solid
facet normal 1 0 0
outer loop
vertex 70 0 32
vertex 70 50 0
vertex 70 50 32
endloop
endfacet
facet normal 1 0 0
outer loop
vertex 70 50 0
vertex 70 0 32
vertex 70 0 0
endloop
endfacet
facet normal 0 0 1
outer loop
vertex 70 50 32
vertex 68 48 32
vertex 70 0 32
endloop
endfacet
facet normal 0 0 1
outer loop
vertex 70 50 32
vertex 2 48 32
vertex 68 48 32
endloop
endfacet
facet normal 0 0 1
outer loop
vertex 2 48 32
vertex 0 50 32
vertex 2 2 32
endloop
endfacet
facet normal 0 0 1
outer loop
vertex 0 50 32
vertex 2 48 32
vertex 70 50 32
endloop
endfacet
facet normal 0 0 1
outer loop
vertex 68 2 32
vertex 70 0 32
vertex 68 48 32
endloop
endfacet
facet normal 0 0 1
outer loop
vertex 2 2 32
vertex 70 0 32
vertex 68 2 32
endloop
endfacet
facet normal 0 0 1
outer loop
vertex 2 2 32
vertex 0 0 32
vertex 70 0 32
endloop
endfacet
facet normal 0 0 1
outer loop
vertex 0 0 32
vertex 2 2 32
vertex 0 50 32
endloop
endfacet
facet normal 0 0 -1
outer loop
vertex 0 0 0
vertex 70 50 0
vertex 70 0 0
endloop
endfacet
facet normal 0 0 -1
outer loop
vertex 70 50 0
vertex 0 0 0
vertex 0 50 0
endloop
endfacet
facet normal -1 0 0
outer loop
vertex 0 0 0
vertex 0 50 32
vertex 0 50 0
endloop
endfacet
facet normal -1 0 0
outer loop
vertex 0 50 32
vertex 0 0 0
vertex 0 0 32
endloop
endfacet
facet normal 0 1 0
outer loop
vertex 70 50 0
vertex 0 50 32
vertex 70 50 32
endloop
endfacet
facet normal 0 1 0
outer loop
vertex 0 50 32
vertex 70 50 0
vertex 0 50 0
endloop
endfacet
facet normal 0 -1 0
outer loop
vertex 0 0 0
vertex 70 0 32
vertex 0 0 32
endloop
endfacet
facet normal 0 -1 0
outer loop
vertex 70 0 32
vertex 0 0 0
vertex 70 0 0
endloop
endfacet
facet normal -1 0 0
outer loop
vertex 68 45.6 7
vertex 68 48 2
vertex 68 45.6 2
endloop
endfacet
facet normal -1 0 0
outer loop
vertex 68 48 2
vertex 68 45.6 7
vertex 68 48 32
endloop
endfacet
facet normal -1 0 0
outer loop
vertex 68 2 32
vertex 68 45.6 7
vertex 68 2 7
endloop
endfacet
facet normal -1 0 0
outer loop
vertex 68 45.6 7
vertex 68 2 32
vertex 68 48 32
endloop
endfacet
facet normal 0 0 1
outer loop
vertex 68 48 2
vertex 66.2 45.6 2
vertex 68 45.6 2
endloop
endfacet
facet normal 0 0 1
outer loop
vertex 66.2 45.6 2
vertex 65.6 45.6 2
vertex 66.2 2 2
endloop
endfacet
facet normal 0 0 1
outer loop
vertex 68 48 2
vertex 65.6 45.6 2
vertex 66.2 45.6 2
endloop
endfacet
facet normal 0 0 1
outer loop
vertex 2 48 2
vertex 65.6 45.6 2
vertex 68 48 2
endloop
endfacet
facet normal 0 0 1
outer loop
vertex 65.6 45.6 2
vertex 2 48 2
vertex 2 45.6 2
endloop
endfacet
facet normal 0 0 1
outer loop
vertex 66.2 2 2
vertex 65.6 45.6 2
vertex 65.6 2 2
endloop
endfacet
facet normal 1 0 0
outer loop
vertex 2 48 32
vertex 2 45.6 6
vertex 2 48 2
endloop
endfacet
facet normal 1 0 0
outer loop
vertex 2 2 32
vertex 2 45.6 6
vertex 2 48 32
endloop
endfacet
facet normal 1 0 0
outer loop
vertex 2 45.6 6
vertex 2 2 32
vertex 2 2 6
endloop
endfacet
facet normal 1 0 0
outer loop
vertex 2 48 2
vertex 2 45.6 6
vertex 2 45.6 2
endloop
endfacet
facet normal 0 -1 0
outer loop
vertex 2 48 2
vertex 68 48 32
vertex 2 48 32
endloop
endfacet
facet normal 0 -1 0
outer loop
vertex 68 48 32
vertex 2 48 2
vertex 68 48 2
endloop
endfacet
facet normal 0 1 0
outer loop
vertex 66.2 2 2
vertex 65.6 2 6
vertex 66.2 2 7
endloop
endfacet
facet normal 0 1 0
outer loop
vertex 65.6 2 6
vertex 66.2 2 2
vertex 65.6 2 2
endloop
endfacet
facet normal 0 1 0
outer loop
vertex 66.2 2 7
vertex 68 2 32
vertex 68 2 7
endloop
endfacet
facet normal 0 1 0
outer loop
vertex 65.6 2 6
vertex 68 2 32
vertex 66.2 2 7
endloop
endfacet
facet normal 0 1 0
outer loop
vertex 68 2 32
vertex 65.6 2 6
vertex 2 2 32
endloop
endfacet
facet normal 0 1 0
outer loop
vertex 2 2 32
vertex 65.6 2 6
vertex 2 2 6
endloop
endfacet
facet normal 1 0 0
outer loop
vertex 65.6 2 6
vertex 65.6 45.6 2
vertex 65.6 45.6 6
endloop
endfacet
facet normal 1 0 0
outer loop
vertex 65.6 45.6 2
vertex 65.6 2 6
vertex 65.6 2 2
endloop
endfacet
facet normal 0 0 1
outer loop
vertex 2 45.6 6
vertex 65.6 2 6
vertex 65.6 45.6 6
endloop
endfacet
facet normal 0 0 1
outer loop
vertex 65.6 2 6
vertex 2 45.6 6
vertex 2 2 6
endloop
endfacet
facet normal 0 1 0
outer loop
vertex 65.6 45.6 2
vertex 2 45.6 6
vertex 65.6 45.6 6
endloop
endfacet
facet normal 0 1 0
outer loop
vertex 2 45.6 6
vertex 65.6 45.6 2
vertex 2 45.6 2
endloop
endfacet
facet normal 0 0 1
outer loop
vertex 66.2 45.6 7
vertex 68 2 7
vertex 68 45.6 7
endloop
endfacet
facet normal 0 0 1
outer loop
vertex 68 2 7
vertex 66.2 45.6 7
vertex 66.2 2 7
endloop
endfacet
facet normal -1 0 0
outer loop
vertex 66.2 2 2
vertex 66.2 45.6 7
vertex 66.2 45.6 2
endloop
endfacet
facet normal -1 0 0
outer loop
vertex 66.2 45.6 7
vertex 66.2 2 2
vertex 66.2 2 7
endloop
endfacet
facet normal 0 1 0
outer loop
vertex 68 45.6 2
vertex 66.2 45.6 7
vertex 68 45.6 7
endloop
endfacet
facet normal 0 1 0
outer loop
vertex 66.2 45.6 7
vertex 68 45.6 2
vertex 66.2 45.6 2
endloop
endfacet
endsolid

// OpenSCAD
// Two-part enclosure for a small electronics board (e.g. Arduino-based temperature logger)
// Print orientation: both parts rest on the bed (z = 0), side by side, with a 10 mm gap.

// ---------------- Parameters ----------------
box_x      = 70;    // box outer length (X)
box_y      = 50;    // box outer width (Y)
box_z      = 30;    // box height (Z)
box_wall   = 2;     // box wall thickness
box_floor  = 2;     // box floor thickness

lid_t      = 2;     // lid plate thickness
lip_t      = 1.5;   // lip (overhang) thickness
lip_h      = 4;     // lip height above plate
lip_x      = 65.6;  // lip outer length (X)
lip_y      = 45.6;  // lip outer width (Y)
lip_over_x = 4;     // lip overhang past box end (X)
clearance  = 0.2;   // clearance between lip and box opening

$fn = 64;

// ---------------- Derived ----------------
lip_x2 = lip_x - 2 * clearance;   // lip size inside box (X)
lip_y2 = lip_y - 2 * clearance;   // lip size inside box (Y)
overlap = lip_over_x - clearance; // lip extends past box end by this amount

// ---------------- Model ----------------
union() {
    // Part 1: Box (open top)
    difference() {
        cube([box_x, box_y, box_z + box_floor]);
        translate([box_wall, box_wall, box_floor])
            cube([box_x - 2 * box_wall, box_y - 2 * box_wall, box_z + 1]);
    }

    // Part 2: Lid (plate with a centred lip on top, printed upside down)
    union() {
        // Plate
        translate([0, 0, 0])
            cube([box_x, box_y, lid_t]);

        // Lip
        translate([0, 0, lid_t])
            cube([lip_x, lip_y, lip_h]);

        // Cut out the part of the lip that sticks out past the box end
        translate([box_x - overlap, 0, lid_t])
            cube([overlap, lip_y, lip_h + 1]);
    }
}
